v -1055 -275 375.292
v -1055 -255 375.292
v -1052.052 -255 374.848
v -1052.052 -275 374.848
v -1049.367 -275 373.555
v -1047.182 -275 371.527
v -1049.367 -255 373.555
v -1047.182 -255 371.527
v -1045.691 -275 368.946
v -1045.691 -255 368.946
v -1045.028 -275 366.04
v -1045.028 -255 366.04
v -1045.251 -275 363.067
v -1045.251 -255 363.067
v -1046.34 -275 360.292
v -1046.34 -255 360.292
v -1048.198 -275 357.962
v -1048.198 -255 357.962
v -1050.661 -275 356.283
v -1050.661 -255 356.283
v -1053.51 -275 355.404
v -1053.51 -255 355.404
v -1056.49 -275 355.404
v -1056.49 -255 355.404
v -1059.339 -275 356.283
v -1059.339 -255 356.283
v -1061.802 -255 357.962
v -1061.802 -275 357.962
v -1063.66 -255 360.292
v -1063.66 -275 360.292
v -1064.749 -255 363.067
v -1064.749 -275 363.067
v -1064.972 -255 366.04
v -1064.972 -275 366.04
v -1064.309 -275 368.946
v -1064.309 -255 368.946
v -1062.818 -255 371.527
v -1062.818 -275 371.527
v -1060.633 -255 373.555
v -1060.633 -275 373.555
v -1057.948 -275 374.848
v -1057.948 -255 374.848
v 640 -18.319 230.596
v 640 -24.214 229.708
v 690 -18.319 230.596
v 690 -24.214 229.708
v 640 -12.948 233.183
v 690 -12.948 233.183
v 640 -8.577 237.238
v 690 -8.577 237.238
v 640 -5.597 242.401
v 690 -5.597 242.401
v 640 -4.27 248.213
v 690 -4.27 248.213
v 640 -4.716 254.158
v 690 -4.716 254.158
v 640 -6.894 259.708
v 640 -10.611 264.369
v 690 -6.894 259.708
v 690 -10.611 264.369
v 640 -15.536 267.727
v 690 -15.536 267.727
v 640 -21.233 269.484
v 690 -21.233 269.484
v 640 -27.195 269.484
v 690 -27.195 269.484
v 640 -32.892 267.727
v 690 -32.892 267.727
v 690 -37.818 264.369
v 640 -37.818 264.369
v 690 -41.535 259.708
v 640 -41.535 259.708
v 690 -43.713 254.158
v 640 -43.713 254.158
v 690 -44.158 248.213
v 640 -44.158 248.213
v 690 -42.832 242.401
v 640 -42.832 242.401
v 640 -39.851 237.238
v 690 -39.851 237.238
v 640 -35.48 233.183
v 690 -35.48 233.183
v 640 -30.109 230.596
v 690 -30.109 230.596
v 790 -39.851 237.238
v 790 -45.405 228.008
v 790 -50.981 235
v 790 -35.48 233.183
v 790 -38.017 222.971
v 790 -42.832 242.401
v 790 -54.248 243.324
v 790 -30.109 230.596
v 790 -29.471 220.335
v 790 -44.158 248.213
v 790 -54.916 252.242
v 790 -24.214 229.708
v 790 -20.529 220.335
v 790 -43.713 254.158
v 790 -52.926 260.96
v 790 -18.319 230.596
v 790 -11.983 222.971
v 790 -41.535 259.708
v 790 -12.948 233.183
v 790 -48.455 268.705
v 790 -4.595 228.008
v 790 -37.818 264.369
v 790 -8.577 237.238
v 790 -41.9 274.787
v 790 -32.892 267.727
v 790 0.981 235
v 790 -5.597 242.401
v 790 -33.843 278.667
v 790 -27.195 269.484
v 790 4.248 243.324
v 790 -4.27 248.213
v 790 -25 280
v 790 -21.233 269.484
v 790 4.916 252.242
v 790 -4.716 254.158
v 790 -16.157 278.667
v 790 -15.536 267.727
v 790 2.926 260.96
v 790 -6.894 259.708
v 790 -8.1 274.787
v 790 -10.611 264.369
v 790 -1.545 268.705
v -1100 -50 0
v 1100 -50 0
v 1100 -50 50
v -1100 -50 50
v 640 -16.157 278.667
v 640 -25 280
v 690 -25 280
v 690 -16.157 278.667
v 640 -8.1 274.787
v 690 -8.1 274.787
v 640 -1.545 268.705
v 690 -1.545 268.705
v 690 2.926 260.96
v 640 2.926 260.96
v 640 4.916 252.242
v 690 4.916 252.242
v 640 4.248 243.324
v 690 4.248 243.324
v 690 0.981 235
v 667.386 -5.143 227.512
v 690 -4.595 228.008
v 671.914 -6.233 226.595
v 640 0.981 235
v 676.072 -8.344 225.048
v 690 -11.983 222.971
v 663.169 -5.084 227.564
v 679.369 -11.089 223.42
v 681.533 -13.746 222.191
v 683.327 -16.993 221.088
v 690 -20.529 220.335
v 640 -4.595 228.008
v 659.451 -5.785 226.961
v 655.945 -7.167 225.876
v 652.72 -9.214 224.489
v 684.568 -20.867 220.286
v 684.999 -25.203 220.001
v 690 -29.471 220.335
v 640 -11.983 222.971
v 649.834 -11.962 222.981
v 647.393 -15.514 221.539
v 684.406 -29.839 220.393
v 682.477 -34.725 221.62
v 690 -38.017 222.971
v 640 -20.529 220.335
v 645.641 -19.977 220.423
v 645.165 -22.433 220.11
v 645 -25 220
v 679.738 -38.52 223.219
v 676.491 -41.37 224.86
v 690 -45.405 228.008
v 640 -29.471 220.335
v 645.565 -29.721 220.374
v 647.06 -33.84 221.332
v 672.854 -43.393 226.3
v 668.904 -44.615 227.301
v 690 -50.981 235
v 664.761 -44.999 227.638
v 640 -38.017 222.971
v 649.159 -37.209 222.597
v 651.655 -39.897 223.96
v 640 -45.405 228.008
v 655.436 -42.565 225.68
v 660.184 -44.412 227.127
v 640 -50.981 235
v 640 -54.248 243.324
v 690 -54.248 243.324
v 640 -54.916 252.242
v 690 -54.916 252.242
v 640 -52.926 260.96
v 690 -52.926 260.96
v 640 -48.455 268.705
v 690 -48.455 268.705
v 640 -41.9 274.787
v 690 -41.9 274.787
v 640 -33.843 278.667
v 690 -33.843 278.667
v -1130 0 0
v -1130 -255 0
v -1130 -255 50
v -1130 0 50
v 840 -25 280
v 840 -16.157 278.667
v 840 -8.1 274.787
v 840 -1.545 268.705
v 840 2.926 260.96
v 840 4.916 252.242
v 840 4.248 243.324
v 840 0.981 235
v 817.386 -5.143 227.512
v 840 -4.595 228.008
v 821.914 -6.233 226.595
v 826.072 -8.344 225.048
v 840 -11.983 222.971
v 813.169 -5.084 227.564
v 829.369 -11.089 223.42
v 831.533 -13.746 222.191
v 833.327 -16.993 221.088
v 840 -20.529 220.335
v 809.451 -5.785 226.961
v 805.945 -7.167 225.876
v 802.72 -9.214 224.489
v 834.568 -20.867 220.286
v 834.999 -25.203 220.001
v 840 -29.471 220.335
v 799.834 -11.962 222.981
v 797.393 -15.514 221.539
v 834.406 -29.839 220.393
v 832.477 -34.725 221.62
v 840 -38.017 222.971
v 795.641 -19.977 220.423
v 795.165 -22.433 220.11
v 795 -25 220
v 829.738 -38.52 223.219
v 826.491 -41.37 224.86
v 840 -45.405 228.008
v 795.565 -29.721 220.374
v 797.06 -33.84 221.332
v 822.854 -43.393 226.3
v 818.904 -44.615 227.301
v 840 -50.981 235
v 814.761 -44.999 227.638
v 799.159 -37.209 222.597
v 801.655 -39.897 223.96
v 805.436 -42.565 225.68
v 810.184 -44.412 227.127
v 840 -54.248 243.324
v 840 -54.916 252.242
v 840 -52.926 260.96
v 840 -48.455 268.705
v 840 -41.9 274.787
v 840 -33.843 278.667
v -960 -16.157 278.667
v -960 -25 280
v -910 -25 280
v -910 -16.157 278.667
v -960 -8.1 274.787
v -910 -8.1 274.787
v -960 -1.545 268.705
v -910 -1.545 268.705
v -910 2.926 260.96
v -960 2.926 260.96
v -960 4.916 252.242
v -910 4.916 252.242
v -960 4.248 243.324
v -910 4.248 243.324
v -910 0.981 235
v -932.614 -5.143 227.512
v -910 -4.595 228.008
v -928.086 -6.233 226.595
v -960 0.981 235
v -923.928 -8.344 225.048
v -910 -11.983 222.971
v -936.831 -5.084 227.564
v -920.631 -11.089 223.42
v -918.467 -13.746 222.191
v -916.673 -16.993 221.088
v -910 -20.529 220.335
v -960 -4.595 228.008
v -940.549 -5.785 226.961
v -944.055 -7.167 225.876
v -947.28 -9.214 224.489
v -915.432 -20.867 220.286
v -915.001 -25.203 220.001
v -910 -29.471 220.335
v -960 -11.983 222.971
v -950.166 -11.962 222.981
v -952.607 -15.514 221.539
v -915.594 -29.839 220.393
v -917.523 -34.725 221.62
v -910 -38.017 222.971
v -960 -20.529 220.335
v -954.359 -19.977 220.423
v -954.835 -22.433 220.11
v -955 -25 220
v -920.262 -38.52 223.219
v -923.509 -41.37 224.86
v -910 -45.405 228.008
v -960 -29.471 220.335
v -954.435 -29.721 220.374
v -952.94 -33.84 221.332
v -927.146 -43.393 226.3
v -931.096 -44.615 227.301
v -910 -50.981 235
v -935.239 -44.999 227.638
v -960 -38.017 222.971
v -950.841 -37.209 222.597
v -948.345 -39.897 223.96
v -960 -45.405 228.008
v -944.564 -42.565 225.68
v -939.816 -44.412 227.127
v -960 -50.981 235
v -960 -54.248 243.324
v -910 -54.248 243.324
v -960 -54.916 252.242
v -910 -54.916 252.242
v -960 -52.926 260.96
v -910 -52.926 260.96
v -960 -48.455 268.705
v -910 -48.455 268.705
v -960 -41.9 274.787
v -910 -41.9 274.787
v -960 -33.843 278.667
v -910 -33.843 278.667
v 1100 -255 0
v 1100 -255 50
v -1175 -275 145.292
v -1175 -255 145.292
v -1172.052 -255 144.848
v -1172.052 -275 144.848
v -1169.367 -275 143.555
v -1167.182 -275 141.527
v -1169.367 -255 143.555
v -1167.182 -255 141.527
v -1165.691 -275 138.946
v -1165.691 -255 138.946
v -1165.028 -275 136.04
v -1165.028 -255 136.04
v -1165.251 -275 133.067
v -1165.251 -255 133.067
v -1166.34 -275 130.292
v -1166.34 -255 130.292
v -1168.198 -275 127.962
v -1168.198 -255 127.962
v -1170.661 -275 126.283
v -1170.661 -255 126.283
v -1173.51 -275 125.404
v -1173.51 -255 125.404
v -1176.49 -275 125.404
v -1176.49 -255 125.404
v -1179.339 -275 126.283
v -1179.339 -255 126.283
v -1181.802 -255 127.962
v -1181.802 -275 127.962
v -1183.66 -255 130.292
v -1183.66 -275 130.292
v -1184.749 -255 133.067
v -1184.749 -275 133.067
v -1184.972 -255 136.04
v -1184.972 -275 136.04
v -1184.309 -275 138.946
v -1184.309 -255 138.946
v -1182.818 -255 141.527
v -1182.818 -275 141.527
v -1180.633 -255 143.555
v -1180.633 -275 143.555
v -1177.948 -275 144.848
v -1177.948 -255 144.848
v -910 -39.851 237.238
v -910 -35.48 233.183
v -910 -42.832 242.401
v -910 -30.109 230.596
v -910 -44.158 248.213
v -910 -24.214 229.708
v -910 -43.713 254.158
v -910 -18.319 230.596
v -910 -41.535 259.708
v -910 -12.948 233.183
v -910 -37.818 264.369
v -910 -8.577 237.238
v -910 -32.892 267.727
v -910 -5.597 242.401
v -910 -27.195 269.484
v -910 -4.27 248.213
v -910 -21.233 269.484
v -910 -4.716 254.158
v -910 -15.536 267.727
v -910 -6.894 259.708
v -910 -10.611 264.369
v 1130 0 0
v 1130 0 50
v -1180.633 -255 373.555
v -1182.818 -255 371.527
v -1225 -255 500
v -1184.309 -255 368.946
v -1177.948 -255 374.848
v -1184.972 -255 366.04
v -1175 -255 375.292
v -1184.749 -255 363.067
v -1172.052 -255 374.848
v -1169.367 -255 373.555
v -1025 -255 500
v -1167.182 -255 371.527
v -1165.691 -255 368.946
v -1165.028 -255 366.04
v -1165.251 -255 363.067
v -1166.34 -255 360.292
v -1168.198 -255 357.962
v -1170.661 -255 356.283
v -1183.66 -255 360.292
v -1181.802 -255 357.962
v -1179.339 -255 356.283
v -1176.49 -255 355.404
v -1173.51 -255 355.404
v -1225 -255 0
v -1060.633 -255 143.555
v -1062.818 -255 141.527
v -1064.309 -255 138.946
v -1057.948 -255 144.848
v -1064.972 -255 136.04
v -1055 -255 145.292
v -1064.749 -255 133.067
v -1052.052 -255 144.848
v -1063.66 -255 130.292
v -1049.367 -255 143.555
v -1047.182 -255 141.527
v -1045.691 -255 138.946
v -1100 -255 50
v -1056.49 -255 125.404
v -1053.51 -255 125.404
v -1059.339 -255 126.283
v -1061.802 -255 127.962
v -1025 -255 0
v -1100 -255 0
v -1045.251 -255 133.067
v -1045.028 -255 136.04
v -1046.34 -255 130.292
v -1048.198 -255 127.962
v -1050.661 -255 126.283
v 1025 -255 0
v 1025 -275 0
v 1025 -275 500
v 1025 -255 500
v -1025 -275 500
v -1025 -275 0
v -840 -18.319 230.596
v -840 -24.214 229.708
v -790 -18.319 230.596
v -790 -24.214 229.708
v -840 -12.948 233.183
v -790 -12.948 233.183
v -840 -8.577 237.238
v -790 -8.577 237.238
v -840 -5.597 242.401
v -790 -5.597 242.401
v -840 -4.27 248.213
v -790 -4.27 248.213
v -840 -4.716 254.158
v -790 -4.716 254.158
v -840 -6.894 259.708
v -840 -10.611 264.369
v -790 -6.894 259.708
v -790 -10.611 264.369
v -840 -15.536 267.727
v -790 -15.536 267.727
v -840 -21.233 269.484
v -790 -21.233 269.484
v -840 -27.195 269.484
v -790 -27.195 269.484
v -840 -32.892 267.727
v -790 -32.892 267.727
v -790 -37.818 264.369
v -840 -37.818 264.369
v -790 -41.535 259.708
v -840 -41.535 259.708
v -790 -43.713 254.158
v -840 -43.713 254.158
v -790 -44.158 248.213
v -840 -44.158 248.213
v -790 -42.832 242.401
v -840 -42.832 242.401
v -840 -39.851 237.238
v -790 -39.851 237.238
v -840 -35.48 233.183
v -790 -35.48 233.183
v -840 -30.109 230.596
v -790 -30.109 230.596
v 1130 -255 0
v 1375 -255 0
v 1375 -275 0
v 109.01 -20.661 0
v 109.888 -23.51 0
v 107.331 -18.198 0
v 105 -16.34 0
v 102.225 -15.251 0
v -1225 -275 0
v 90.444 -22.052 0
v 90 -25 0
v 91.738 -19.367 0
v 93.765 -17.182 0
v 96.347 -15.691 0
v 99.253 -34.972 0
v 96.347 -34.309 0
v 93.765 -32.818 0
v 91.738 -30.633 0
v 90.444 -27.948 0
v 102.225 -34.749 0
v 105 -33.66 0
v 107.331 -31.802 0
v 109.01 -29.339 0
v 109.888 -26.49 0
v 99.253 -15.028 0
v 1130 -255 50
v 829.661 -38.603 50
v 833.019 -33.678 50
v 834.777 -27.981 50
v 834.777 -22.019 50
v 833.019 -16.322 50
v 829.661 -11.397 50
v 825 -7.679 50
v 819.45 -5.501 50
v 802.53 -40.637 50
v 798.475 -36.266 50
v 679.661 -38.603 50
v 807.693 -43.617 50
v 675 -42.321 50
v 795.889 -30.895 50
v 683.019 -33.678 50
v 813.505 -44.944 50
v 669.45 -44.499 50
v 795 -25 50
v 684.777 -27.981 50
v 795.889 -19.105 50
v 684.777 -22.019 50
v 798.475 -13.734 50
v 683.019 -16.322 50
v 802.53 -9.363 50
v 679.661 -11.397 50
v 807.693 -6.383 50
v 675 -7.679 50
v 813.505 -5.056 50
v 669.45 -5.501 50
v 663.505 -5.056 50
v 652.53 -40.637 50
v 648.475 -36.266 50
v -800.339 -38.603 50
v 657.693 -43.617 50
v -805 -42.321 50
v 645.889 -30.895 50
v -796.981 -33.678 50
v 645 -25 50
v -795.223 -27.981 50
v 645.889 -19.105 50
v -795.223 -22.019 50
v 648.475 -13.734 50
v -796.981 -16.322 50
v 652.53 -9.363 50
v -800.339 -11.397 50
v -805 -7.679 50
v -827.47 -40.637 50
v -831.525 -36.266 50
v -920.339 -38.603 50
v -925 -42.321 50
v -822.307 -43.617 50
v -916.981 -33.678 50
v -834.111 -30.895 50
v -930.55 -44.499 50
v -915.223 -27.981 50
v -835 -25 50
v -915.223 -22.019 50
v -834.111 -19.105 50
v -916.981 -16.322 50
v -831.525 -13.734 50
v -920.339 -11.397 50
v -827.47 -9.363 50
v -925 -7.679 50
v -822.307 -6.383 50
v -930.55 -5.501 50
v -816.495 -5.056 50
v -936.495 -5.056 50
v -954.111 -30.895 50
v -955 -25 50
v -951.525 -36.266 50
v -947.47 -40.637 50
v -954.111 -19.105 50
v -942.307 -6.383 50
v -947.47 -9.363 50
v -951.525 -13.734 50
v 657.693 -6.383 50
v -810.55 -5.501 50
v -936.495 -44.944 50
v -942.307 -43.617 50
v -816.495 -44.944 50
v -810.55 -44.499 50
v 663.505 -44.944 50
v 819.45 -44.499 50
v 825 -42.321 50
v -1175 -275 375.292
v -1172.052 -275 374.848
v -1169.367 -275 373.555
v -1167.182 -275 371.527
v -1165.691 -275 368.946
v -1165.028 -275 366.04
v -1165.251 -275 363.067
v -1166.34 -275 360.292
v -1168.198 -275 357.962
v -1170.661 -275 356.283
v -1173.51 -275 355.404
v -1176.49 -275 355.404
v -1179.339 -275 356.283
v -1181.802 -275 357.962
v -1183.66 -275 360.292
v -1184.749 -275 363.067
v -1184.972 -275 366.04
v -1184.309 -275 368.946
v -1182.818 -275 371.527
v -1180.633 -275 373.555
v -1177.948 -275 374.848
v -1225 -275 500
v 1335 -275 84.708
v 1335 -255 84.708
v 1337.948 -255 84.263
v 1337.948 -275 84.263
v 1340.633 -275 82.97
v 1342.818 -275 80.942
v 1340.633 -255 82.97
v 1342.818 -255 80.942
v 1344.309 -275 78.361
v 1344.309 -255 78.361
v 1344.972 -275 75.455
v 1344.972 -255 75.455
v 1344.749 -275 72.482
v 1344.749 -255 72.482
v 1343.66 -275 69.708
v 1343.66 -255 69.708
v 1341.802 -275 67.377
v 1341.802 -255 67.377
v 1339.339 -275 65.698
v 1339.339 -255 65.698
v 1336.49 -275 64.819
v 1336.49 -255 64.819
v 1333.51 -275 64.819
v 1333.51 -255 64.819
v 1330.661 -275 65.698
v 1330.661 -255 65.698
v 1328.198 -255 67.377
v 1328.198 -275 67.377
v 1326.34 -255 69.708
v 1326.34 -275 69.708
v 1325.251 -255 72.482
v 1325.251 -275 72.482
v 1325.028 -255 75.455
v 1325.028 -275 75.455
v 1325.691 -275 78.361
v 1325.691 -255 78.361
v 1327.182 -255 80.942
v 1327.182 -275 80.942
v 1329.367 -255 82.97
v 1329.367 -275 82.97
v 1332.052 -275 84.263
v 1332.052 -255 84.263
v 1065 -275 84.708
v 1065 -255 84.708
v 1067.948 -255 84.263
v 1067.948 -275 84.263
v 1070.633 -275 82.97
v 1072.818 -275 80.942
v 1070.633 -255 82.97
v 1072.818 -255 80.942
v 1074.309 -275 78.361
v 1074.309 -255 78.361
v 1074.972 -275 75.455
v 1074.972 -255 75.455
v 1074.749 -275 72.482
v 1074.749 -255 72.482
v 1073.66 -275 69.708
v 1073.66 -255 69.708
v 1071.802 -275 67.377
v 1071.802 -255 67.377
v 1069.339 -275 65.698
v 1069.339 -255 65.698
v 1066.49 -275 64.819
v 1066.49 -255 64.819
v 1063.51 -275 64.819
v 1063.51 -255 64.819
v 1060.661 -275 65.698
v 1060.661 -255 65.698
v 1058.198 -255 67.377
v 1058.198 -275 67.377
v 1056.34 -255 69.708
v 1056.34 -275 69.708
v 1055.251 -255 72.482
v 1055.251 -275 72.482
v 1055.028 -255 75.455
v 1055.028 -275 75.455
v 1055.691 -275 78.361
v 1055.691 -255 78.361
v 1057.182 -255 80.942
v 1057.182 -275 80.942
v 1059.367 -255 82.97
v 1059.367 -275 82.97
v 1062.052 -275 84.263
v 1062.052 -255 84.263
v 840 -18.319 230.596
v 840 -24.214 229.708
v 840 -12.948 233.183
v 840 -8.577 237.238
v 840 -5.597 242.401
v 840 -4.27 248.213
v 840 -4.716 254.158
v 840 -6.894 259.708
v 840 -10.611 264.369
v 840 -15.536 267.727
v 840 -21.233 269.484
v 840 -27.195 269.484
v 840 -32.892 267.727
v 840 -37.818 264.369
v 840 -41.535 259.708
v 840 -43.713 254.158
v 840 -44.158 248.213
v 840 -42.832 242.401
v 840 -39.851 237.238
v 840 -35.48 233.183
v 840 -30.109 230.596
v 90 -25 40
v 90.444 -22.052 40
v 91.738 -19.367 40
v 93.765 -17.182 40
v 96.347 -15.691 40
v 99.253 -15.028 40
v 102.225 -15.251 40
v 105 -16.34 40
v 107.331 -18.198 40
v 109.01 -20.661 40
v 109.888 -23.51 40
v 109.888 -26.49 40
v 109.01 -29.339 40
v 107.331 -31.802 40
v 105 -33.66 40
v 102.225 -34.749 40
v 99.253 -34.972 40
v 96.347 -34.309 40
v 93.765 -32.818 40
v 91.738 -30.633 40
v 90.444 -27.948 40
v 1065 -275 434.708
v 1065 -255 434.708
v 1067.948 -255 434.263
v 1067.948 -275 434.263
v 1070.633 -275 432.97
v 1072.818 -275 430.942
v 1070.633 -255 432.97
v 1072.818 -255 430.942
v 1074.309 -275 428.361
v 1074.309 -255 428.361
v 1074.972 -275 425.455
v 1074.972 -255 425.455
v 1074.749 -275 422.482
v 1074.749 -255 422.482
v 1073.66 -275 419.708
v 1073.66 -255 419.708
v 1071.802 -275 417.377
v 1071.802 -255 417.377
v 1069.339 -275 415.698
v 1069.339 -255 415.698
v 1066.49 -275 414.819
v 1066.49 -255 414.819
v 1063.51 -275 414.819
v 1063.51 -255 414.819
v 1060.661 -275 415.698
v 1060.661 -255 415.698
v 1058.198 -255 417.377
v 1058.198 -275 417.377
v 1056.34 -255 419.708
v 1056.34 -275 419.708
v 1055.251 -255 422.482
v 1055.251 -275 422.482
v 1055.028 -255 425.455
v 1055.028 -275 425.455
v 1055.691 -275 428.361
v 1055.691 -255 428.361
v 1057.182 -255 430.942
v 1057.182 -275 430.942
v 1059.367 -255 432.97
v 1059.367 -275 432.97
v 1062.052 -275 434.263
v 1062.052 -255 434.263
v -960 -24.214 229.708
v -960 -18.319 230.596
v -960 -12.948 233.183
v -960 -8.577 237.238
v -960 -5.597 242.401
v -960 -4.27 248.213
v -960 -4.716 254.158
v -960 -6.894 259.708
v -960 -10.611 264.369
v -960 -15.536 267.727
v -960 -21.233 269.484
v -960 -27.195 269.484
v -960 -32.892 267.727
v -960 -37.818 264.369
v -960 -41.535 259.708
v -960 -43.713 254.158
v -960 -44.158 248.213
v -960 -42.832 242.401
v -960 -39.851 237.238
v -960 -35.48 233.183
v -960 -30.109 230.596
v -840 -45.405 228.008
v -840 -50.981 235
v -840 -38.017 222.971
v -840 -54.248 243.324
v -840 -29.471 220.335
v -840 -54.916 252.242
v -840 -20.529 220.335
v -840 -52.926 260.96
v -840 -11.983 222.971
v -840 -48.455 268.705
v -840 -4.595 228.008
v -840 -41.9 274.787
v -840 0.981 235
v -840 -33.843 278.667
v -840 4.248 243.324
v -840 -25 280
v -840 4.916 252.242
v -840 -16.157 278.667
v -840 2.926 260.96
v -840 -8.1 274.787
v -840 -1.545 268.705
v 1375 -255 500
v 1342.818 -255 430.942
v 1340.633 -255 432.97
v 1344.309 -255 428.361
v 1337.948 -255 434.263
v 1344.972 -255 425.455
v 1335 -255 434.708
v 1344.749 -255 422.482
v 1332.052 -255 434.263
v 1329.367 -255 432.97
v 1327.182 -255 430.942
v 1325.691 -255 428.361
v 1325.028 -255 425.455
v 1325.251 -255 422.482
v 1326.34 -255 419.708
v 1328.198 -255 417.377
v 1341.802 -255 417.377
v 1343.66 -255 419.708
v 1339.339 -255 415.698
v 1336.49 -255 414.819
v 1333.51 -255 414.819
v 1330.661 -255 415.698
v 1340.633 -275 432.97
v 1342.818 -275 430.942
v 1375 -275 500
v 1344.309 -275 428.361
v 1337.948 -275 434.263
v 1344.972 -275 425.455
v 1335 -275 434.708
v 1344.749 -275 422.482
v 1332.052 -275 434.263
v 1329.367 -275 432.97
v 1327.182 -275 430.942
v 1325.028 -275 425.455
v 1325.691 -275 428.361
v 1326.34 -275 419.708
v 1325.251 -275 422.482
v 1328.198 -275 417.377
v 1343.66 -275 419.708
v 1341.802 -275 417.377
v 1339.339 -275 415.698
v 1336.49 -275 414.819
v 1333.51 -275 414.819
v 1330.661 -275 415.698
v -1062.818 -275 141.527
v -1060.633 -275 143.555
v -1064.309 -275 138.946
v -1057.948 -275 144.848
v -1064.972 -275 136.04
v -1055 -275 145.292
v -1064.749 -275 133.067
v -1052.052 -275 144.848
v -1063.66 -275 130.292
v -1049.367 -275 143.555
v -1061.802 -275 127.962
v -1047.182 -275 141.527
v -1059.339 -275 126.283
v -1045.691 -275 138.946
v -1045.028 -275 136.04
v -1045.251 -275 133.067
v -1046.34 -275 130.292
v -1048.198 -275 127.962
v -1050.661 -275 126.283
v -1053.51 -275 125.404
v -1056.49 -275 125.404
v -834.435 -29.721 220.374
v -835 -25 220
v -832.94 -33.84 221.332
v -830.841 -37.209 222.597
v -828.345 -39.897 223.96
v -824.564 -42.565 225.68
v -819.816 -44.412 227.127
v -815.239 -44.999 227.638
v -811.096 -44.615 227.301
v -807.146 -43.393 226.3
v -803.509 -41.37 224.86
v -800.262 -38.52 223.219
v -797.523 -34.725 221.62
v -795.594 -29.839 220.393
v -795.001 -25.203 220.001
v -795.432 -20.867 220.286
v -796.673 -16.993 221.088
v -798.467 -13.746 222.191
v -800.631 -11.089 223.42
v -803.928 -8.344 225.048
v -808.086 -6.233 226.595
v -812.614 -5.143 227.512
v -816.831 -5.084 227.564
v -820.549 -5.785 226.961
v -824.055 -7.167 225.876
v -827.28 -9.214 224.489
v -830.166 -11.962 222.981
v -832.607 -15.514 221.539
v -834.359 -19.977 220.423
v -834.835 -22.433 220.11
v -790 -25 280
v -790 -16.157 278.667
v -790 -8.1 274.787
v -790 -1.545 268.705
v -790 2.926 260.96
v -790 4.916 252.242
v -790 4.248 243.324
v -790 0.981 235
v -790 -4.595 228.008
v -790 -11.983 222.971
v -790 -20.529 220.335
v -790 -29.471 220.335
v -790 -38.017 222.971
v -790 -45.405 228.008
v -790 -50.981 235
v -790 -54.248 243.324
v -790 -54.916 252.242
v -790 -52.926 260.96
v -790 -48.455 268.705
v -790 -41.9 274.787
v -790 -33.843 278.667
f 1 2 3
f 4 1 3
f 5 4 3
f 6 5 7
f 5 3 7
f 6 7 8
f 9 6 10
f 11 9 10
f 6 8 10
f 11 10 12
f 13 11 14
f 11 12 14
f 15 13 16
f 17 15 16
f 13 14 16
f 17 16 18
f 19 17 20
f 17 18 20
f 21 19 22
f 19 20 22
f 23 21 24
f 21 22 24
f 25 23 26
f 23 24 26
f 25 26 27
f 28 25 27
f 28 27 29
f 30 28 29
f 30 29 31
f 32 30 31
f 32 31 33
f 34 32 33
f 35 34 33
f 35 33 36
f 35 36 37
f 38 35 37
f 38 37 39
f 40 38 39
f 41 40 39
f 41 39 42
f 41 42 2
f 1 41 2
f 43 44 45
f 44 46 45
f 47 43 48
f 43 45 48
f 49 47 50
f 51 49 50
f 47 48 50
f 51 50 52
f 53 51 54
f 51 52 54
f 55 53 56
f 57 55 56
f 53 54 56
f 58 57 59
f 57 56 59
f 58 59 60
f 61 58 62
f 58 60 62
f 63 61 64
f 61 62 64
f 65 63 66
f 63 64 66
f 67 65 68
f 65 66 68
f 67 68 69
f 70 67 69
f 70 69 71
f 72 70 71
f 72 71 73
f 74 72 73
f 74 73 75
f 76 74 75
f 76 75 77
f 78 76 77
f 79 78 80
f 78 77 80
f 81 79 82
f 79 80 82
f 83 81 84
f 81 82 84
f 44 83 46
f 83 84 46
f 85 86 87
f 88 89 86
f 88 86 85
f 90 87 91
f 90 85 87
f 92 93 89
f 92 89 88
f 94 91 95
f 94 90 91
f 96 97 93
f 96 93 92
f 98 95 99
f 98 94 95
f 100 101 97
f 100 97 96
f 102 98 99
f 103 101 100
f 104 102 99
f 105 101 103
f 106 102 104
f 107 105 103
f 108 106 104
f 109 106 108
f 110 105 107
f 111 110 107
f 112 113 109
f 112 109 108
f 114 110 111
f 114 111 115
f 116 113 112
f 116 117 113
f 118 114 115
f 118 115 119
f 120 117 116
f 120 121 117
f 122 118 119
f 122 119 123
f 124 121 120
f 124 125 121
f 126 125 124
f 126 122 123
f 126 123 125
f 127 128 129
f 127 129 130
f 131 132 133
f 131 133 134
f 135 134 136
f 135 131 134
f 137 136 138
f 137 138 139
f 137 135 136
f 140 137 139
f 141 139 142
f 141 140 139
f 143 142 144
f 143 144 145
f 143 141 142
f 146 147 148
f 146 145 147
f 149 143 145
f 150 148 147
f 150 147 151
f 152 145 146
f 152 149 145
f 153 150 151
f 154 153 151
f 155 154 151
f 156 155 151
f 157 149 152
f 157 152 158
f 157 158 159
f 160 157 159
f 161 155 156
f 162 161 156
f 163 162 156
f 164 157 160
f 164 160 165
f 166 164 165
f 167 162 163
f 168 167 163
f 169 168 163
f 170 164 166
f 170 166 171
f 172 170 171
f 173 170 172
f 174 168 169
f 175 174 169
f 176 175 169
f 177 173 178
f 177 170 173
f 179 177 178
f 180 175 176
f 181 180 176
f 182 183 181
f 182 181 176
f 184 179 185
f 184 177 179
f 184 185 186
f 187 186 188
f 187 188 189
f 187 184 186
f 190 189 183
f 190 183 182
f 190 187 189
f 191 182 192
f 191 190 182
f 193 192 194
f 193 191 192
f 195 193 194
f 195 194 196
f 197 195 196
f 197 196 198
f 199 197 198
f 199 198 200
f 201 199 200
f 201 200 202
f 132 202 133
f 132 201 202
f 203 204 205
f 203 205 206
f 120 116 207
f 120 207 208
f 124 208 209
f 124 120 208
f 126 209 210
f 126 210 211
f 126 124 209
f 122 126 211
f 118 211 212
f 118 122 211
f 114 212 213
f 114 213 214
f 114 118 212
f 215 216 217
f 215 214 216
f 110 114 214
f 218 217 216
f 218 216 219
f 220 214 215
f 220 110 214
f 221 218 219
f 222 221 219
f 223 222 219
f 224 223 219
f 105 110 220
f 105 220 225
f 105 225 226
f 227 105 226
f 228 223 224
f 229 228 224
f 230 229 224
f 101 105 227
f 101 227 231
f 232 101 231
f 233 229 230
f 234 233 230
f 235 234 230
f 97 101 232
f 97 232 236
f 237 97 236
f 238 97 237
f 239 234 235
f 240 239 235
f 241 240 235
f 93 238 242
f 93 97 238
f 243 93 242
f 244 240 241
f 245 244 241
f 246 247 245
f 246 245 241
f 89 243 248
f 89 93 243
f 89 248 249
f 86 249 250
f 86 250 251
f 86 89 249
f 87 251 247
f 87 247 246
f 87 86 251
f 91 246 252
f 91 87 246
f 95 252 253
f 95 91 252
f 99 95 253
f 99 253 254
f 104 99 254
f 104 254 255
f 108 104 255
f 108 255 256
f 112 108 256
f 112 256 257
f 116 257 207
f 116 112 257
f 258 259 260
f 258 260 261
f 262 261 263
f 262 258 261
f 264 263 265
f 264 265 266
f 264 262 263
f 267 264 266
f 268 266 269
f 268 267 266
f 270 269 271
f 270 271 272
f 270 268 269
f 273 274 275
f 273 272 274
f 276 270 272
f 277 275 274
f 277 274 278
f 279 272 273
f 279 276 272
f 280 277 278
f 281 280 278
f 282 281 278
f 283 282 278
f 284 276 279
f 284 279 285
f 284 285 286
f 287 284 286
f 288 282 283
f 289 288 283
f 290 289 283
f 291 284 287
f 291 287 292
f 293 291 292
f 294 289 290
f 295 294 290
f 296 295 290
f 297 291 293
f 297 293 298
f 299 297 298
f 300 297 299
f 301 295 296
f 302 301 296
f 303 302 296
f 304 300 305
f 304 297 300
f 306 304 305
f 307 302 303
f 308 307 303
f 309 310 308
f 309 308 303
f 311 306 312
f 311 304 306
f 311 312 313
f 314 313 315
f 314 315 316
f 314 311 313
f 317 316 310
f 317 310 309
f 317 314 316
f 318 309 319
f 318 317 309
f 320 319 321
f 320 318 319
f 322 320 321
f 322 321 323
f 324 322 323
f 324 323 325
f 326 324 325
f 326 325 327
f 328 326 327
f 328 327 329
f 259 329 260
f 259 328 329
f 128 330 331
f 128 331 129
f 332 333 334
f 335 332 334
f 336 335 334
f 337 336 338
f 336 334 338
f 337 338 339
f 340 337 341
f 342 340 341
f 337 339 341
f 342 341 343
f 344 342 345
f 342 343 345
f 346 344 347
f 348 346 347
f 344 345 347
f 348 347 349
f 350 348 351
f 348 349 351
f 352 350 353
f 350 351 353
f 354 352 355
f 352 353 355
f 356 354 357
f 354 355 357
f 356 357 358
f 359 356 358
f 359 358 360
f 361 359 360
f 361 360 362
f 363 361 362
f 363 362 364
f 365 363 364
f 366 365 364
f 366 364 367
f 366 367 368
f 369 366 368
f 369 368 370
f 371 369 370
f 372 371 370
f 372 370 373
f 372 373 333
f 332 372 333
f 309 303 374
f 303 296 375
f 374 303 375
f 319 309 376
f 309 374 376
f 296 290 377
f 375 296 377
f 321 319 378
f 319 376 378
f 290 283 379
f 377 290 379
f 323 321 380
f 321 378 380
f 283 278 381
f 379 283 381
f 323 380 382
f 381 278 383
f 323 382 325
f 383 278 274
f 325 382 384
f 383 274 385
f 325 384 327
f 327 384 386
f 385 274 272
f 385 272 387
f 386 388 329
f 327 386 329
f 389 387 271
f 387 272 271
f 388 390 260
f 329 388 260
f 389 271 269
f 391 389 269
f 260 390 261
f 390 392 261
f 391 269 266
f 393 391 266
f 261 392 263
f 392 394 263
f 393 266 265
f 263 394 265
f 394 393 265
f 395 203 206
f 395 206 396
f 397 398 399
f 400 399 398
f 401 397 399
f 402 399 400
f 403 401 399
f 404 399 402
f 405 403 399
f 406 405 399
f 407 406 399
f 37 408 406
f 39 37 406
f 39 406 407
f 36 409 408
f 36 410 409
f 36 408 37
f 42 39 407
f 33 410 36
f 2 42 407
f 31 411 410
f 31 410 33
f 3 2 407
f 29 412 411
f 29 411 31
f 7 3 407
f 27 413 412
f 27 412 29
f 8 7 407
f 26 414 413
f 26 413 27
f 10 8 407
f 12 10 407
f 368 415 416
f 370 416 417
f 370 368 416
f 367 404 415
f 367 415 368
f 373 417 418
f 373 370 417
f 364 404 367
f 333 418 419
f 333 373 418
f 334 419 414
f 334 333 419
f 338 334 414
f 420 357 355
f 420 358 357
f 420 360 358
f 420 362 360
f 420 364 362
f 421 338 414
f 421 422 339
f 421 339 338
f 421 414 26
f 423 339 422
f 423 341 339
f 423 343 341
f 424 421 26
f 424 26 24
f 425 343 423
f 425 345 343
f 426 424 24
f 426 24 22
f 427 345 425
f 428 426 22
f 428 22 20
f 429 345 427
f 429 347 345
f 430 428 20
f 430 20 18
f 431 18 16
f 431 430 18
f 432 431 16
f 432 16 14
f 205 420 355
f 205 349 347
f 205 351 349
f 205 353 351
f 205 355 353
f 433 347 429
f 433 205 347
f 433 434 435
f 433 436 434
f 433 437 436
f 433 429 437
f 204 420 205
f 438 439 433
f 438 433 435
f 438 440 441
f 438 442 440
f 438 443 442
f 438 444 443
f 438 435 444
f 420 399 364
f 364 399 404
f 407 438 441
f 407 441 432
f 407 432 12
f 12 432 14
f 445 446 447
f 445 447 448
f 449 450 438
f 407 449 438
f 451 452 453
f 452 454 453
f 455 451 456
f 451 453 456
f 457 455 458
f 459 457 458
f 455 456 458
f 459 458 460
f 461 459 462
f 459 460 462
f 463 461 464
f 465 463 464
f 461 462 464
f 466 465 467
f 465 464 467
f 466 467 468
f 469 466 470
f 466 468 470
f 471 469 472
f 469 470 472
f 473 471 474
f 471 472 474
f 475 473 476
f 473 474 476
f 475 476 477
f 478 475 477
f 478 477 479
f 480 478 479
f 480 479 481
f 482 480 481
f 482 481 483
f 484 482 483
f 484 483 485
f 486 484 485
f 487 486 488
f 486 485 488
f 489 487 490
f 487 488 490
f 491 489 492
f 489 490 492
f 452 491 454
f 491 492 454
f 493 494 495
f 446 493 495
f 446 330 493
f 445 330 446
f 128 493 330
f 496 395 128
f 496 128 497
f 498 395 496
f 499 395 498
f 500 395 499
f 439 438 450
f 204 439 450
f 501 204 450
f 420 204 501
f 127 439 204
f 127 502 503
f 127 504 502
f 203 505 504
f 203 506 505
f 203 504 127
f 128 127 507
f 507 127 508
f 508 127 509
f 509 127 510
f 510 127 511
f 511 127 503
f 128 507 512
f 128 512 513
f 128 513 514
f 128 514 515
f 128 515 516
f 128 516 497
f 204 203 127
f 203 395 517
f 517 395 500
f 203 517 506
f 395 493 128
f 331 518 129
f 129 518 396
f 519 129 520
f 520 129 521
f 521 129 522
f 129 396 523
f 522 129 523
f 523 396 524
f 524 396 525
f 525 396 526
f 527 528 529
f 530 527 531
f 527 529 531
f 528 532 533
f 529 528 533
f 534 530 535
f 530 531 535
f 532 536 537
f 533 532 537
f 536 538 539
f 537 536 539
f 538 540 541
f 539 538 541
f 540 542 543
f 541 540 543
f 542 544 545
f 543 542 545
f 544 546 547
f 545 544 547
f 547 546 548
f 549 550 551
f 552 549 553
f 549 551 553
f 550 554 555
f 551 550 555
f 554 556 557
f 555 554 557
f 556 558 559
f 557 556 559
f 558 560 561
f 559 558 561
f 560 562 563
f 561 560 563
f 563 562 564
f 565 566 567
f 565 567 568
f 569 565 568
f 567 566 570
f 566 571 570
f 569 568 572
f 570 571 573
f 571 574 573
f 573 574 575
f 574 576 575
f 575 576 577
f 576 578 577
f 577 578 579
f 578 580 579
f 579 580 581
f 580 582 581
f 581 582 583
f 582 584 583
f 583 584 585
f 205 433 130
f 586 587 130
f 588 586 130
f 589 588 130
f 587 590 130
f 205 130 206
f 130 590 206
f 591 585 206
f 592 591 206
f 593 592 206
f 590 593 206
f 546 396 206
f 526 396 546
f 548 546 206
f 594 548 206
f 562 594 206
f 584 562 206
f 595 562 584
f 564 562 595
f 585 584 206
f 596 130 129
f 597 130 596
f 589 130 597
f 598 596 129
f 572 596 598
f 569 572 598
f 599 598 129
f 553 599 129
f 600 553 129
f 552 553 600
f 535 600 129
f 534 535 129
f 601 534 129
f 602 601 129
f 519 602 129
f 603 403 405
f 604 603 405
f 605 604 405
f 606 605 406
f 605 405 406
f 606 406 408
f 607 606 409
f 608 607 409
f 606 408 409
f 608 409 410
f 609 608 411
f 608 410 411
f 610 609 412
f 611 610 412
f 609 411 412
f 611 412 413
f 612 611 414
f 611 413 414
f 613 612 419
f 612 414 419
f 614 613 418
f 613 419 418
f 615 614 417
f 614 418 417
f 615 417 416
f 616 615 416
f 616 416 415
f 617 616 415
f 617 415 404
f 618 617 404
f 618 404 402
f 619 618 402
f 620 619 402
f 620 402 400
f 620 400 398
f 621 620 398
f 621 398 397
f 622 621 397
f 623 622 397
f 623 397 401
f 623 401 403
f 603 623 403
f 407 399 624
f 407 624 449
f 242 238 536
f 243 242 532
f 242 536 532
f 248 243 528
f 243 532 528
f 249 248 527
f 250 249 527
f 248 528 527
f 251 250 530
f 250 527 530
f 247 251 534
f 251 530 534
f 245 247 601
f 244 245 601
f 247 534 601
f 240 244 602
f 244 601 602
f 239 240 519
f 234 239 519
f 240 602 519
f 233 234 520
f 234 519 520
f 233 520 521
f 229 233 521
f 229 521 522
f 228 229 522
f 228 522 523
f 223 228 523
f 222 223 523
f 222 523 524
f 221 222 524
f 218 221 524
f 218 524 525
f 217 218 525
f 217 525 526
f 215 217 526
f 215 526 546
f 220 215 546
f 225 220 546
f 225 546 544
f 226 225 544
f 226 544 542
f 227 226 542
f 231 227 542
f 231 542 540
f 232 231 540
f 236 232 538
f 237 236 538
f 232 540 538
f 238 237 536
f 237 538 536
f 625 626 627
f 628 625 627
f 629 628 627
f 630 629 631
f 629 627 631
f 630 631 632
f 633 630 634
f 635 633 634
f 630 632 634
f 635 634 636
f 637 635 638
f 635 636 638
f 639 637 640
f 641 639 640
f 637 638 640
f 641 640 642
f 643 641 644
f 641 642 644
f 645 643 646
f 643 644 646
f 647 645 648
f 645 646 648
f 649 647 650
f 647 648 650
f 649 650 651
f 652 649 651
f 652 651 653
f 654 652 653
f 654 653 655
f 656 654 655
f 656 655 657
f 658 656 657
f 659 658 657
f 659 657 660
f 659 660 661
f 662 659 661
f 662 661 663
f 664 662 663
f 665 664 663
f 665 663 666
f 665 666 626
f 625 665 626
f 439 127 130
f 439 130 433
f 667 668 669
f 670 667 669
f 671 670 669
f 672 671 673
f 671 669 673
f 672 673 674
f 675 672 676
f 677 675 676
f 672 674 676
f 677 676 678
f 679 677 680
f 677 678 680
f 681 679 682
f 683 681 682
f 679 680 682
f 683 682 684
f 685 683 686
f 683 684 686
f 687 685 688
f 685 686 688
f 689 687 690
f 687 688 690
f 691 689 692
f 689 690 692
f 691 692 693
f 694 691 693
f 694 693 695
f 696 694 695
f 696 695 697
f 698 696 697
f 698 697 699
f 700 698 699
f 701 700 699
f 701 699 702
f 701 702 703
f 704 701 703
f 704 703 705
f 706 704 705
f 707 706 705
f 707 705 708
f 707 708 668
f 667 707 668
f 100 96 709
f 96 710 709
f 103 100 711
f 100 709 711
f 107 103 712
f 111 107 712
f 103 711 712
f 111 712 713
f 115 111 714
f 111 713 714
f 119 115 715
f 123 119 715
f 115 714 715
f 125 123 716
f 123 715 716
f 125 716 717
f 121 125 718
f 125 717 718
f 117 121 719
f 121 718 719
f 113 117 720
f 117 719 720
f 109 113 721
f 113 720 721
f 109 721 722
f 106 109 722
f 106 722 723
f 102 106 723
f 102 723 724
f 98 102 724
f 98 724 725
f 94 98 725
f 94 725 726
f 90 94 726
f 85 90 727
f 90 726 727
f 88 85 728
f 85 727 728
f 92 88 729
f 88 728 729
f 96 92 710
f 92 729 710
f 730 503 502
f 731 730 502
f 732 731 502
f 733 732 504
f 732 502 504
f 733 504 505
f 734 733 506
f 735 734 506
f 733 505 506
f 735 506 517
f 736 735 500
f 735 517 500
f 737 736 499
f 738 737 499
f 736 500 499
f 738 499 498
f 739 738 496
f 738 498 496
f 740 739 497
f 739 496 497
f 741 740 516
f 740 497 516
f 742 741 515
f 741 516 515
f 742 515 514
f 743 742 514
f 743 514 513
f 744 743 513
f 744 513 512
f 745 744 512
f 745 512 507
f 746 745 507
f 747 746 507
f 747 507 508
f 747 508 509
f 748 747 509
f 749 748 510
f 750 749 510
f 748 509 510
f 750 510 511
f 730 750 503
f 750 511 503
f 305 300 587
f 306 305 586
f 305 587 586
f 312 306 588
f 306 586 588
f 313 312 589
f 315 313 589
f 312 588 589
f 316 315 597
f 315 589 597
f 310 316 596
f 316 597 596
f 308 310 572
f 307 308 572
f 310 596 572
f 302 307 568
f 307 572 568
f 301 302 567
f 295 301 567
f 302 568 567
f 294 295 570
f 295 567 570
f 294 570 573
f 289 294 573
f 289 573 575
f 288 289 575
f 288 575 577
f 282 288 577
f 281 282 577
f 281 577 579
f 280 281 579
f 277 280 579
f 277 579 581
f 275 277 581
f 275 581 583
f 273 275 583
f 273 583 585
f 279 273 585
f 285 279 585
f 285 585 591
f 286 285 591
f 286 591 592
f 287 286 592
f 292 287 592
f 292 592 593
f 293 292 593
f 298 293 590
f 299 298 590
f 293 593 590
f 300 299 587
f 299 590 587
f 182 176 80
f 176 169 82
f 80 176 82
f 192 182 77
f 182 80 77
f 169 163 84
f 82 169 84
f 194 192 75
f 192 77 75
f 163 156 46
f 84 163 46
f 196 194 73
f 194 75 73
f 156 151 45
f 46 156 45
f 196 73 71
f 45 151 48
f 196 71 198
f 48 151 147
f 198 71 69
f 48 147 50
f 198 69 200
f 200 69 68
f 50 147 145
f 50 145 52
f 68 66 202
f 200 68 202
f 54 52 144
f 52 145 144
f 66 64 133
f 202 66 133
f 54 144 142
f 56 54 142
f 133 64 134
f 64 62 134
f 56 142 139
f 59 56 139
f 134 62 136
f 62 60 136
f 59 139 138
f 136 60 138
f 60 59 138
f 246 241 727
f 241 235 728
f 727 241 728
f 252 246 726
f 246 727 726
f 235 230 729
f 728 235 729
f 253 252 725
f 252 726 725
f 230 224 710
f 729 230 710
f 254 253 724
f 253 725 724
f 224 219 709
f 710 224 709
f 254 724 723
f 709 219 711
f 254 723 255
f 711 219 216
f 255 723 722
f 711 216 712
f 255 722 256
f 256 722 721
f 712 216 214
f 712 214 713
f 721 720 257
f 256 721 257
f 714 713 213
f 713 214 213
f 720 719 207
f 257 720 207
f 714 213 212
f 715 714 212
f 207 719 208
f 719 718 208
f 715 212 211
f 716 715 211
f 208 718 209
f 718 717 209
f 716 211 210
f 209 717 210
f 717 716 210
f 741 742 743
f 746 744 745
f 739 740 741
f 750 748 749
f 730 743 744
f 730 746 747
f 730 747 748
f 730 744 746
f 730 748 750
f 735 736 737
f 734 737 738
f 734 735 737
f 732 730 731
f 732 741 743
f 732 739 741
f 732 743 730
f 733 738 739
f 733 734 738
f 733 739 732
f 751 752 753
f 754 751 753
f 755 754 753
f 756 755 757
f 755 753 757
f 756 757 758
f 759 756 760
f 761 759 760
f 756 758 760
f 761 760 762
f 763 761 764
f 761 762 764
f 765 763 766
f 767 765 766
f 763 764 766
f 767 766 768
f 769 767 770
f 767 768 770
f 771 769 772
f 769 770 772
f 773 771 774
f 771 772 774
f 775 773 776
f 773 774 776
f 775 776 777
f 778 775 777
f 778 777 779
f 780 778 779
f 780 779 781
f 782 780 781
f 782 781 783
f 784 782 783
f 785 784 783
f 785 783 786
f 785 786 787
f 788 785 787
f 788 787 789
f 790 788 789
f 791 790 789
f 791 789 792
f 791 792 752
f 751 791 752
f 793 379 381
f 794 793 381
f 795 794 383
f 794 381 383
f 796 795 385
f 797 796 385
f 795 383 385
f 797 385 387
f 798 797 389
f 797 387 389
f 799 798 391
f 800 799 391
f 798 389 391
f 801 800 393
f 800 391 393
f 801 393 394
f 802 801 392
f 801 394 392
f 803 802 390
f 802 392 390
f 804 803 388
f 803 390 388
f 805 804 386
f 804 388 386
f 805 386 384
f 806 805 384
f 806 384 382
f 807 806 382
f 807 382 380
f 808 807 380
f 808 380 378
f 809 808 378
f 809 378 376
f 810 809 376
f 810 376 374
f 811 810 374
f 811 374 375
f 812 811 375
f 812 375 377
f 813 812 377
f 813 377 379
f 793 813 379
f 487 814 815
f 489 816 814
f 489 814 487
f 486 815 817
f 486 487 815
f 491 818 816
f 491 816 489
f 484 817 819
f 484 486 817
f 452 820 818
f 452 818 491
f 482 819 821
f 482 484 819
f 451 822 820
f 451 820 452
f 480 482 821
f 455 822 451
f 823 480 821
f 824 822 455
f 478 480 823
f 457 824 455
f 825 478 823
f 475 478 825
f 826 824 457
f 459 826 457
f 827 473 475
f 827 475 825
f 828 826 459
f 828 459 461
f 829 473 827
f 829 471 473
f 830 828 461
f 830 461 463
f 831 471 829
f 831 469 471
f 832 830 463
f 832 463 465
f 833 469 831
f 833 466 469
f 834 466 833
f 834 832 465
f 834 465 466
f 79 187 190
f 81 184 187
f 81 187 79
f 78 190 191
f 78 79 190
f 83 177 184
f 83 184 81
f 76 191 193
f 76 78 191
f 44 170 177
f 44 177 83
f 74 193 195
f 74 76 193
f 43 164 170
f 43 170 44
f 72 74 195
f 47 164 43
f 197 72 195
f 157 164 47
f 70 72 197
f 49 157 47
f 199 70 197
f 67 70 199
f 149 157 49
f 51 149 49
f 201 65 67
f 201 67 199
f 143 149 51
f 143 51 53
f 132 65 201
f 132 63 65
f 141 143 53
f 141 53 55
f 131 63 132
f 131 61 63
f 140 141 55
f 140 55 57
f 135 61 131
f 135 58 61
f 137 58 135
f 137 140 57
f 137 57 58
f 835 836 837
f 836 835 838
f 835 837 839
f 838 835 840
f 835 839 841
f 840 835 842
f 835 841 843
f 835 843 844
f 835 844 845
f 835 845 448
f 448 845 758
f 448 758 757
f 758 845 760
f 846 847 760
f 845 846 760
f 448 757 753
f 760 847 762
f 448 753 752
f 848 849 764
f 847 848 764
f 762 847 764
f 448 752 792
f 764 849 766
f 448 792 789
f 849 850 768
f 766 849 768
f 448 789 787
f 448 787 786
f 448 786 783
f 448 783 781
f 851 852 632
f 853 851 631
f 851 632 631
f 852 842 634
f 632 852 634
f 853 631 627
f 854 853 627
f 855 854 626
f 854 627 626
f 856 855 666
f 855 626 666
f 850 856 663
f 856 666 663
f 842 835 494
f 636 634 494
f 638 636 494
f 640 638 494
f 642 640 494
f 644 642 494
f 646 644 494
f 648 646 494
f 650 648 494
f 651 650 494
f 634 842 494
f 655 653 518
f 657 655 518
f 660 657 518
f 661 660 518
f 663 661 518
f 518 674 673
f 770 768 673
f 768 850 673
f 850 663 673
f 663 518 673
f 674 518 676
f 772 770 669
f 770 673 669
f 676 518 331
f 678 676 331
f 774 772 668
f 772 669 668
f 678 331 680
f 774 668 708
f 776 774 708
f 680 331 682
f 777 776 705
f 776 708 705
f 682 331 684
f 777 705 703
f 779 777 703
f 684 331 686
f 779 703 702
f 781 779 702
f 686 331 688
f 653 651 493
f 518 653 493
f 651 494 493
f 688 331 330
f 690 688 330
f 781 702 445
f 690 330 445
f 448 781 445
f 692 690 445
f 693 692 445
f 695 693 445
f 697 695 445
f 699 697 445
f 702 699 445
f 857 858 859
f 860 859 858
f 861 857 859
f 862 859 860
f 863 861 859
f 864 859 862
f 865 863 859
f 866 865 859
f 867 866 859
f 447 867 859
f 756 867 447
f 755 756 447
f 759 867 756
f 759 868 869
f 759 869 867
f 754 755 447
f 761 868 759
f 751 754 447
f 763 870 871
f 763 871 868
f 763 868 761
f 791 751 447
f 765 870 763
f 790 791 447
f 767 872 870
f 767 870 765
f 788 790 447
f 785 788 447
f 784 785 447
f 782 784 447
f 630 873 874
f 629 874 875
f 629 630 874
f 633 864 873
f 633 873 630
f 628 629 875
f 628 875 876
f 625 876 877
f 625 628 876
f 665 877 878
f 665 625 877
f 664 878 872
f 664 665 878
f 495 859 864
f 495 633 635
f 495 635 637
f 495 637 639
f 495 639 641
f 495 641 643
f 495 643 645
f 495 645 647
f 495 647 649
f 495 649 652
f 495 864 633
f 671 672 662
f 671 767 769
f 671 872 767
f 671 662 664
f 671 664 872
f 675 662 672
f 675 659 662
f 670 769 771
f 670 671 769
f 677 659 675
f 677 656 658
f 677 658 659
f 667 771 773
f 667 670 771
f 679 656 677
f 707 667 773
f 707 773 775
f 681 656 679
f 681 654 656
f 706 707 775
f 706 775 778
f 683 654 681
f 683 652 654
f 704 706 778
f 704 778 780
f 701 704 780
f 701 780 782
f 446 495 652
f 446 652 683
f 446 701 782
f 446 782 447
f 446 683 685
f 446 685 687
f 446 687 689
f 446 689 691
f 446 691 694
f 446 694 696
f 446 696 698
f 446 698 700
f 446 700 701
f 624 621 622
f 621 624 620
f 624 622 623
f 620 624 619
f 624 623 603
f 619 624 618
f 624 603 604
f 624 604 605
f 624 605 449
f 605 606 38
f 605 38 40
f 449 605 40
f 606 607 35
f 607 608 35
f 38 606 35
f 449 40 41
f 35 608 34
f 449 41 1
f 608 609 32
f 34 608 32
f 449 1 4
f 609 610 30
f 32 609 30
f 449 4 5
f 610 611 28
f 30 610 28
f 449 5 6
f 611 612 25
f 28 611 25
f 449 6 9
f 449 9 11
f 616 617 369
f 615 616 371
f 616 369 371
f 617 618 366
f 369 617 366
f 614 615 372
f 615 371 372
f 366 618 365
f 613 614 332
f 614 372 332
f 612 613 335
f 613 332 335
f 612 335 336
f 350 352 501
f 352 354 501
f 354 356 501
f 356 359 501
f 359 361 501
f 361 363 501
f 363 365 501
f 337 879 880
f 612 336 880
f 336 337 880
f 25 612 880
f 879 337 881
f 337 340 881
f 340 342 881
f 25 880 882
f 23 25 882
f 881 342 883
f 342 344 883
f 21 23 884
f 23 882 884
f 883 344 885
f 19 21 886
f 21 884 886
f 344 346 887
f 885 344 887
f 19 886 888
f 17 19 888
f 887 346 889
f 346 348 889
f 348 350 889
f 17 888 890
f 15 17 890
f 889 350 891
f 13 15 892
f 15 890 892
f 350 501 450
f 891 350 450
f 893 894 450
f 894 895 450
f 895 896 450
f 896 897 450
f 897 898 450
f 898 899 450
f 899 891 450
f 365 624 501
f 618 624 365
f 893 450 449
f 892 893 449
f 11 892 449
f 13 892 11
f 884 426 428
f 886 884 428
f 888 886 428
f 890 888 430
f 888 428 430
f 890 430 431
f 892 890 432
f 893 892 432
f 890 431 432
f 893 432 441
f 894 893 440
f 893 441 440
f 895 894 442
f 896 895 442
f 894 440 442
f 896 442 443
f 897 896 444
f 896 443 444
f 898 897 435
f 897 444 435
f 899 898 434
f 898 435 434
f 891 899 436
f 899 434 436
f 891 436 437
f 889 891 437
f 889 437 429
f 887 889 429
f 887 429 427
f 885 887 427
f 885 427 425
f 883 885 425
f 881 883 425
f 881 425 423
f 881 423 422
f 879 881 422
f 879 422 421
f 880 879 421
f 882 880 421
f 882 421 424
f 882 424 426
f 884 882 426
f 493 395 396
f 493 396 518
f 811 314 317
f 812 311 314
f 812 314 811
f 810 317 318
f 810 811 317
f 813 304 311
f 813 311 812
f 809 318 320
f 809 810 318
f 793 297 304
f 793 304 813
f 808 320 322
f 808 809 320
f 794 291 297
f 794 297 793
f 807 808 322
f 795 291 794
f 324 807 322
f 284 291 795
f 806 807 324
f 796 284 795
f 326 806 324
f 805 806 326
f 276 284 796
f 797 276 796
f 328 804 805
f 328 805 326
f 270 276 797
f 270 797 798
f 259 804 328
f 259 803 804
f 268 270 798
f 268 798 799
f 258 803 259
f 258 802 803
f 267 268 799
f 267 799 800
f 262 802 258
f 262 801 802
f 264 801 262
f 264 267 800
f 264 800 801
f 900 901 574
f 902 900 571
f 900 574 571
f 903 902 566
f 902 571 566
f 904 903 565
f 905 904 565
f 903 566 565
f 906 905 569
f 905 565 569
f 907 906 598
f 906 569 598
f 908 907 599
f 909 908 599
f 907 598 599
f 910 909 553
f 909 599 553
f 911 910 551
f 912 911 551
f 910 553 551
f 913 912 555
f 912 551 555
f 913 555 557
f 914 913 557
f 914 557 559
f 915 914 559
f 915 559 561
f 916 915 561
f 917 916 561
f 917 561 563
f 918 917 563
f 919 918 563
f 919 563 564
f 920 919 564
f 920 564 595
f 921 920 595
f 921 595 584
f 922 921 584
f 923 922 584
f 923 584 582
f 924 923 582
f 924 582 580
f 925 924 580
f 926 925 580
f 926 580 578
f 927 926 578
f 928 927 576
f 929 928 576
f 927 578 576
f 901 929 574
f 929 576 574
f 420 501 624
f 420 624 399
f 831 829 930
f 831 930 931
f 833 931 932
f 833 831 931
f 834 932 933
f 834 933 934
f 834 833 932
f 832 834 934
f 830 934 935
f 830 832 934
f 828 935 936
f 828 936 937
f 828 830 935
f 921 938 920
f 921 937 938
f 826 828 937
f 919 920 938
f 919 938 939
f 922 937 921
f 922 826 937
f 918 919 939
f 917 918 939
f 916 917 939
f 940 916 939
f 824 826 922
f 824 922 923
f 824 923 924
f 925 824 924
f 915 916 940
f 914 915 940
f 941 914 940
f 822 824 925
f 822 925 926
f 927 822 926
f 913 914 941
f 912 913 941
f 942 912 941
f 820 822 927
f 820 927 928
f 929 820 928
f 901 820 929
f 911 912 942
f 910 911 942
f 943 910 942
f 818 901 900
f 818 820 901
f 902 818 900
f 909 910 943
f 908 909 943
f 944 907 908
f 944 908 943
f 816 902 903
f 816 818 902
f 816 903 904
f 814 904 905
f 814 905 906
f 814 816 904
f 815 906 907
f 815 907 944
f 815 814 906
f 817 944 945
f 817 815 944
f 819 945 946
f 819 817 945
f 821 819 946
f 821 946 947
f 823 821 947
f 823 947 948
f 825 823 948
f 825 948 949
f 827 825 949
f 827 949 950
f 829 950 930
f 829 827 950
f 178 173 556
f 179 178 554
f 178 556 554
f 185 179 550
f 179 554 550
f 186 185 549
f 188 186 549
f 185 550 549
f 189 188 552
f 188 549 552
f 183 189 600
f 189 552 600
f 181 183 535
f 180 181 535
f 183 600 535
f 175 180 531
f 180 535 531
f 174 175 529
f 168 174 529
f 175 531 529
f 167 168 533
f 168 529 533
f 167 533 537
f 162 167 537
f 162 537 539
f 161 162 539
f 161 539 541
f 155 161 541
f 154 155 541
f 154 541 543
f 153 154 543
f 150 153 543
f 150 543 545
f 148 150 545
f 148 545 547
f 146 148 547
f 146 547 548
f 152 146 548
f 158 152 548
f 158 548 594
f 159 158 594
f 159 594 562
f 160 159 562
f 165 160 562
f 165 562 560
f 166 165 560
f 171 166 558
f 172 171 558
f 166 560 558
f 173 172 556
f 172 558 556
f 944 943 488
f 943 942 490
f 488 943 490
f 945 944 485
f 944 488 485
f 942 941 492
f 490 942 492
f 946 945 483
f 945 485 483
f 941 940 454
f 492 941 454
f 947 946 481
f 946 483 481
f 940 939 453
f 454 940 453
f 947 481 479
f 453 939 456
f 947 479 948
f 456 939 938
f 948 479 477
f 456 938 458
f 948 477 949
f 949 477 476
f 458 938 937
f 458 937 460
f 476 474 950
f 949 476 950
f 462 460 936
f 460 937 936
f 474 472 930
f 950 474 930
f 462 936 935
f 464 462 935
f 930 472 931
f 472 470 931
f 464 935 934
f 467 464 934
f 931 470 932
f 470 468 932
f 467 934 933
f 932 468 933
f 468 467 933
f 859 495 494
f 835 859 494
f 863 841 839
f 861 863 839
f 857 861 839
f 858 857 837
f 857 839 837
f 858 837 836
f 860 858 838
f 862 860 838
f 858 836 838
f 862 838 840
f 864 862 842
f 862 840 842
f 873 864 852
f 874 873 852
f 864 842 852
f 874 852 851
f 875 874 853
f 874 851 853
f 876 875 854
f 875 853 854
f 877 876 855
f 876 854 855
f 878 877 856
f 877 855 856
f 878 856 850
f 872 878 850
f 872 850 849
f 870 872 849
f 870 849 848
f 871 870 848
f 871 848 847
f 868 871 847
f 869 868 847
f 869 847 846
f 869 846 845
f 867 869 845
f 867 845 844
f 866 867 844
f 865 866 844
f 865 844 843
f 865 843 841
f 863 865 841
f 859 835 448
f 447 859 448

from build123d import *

# Parameters (mm, degrees)
BOSS_EXTRUDE1_DEPTH = 50
SKETCH2_W           = 200
SKETCH2_H           = 20
BOSS_EXTRUDE2_DEPTH = 500
SKETCH4_R           = 20
BOSS_EXTRUDE3_DEPTH = 200
SKETCH6_R           = 30
SKETCH6_R_2         = 12
BOSS_EXTRUDE4_DEPTH = 25
SKETCH8_W           = 350
SKETCH8_H           = 20
BOSS_EXTRUDE5_DEPTH = 500
SKETCH9_R           = 20
CUT_EXTRUDE1_DEPTH  = 2356.175152722
LPATTERN2_COUNT     = 2
LPATTERN2_PITCH     = 1750
LPATTERN4_COUNT     = 2
LPATTERN4_PITCH     = 120
LPATTERN5_COUNT     = 2
LPATTERN5_PITCH     = 1600
CUT_EXTRUDE2_REACH  = 1488.01
SKETCH10_R          = 10
SKETCH11_R          = 10
CUT_EXTRUDE3_DEPTH  = 40


with BuildPart() as part:
    # Sketch1 → Boss-Extrude1 (new body)
    with BuildSketch(Plane.XY):
        Polygon((-1130, 0), (1130, 0), (1130, -255), (1100, -255), (1100, -50), (-1100, -50), (-1100, -255), (-1130, -255), align=None)
    extrude(amount=BOSS_EXTRUDE1_DEPTH)

    # Sketch2 → Boss-Extrude2 (add)
    with BuildSketch(Plane.XY):
        with Locations((-1125, -265)):
            Rectangle(SKETCH2_W, SKETCH2_H)
    extrude(amount=BOSS_EXTRUDE2_DEPTH)

    # Sketch4 → Boss-Extrude3 (add)
    with BuildSketch(Plane.XY.offset(50)):
        with Locations(Location((-935, -25, 0), (0, 0, 180))):
            Circle(SKETCH4_R)
    boss_extrude3 = extrude(amount=BOSS_EXTRUDE3_DEPTH)

    # Sketch6 → Boss-Extrude4 (add, symmetric)
    with BuildSketch(Plane(origin=(-935, 0, 0), x_dir=(0, -1, 0), z_dir=(-1, 0, 0))):
        with Locations(Location((25, 250, 0), (0, 0, 90))):
            Circle(SKETCH6_R)
        with Locations(Location((25, 250, 0), (0, 0, 90))):
            Circle(SKETCH6_R_2, mode=Mode.SUBTRACT)
    boss_extrude4 = extrude(amount=BOSS_EXTRUDE4_DEPTH, both=True)

    # Sketch8 → Boss-Extrude5 (add)
    with BuildSketch(Plane(origin=(0, 0, 0), x_dir=(-1, 0, 0), z_dir=(0, 0, -1))):
        with Locations((-1200, -265)):
            Rectangle(SKETCH8_W, SKETCH8_H)
    extrude(amount=-BOSS_EXTRUDE5_DEPTH)

    # Sketch9 → Cut-Extrude1 (cut, through all)
    with BuildSketch(Plane(origin=(-910, 0, 0), x_dir=(0, 0, -1), z_dir=(1, 0, 0))):
        with Locations((-249.707622987, -24.214075722)):
            Circle(SKETCH9_R)
    cut_extrude1 = extrude(amount=-CUT_EXTRUDE1_DEPTH, mode=Mode.SUBTRACT)

    # LPattern2: Boss-Extrude3, Boss-Extrude4, Cut-Extrude1 ×2
    with Locations(*[(i * LPATTERN2_PITCH, 0, 0) for i in range(1, LPATTERN2_COUNT)]):
        add(boss_extrude3)
        add(boss_extrude4)
        add(cut_extrude1, mode=Mode.SUBTRACT)

    # LPattern4: Boss-Extrude3, Boss-Extrude4, Cut-Extrude1 ×2
    with Locations(*[(i * LPATTERN4_PITCH, 0, 0) for i in range(1, LPATTERN4_COUNT)]):
        add(boss_extrude3)
        add(boss_extrude4)
        add(cut_extrude1, mode=Mode.SUBTRACT)

    # LPattern5: Boss-Extrude3, Boss-Extrude4, Cut-Extrude1 ×2
    with Locations(*[(i * LPATTERN5_PITCH, 0, 0) for i in range(1, LPATTERN5_COUNT)]):
        add(boss_extrude3)
        add(boss_extrude4)
        add(cut_extrude1, mode=Mode.SUBTRACT)

    # Sketch10 → Cut-Extrude2 (cut, up to next)
    with BuildSketch(Plane(origin=(0, -255, 0), x_dir=(1, 0, 0), z_dir=(0, 1, 0)), mode=Mode.PRIVATE) as cut_extrude2_sk1:
        with Locations(Location((1065, -424.7076, 0), (0, 0, 270))):
            Circle(SKETCH10_R)
    cut_extrude2_tool1 = extrude(cut_extrude2_sk1.sketch, amount=-CUT_EXTRUDE2_REACH, mode=Mode.PRIVATE) & part.part
    # Sketch10 → Cut-Extrude2 (cut, up to next)
    with BuildSketch(Plane(origin=(0, -255, 0), x_dir=(1, 0, 0), z_dir=(0, 1, 0)), mode=Mode.PRIVATE) as cut_extrude2_sk2:
        with Locations(Location((1065, -74.7076, 0), (0, 0, 270))):
            Circle(SKETCH10_R)
    cut_extrude2_tool2 = extrude(cut_extrude2_sk2.sketch, amount=-CUT_EXTRUDE2_REACH, mode=Mode.PRIVATE) & part.part
    # Sketch10 → Cut-Extrude2 (cut, up to next)
    with BuildSketch(Plane(origin=(0, -255, 0), x_dir=(1, 0, 0), z_dir=(0, 1, 0)), mode=Mode.PRIVATE) as cut_extrude2_sk3:
        with Locations(Location((1335, -424.7076, 0), (0, 0, 270))):
            Circle(SKETCH10_R)
    cut_extrude2_tool3 = extrude(cut_extrude2_sk3.sketch, amount=-CUT_EXTRUDE2_REACH, mode=Mode.PRIVATE) & part.part
    # Sketch10 → Cut-Extrude2 (cut, up to next)
    with BuildSketch(Plane(origin=(0, -255, 0), x_dir=(1, 0, 0), z_dir=(0, 1, 0)), mode=Mode.PRIVATE) as cut_extrude2_sk4:
        with Locations(Location((1335, -74.7076, 0), (0, 0, 270))):
            Circle(SKETCH10_R)
    cut_extrude2_tool4 = extrude(cut_extrude2_sk4.sketch, amount=-CUT_EXTRUDE2_REACH, mode=Mode.PRIVATE) & part.part
    # Sketch10 → Cut-Extrude2 (cut, up to next)
    with BuildSketch(Plane(origin=(0, -255, 0), x_dir=(1, 0, 0), z_dir=(0, 1, 0)), mode=Mode.PRIVATE) as cut_extrude2_sk5:
        with Locations(Location((-1175, -365.2924, 0), (0, 0, 270))):
            Circle(SKETCH10_R)
    cut_extrude2_tool5 = extrude(cut_extrude2_sk5.sketch, amount=-CUT_EXTRUDE2_REACH, mode=Mode.PRIVATE) & part.part
    # Sketch10 → Cut-Extrude2 (cut, up to next)
    with BuildSketch(Plane(origin=(0, -255, 0), x_dir=(1, 0, 0), z_dir=(0, 1, 0)), mode=Mode.PRIVATE) as cut_extrude2_sk6:
        with Locations(Location((-1055, -365.2924, 0), (0, 0, 270))):
            Circle(SKETCH10_R)
    cut_extrude2_tool6 = extrude(cut_extrude2_sk6.sketch, amount=-CUT_EXTRUDE2_REACH, mode=Mode.PRIVATE) & part.part
    # Sketch10 → Cut-Extrude2 (cut, up to next)
    with BuildSketch(Plane(origin=(0, -255, 0), x_dir=(1, 0, 0), z_dir=(0, 1, 0)), mode=Mode.PRIVATE) as cut_extrude2_sk7:
        with Locations(Location((-1175, -135.2924, 0), (0, 0, 270))):
            Circle(SKETCH10_R)
    cut_extrude2_tool7 = extrude(cut_extrude2_sk7.sketch, amount=-CUT_EXTRUDE2_REACH, mode=Mode.PRIVATE) & part.part
    # Sketch10 → Cut-Extrude2 (cut, up to next)
    with BuildSketch(Plane(origin=(0, -255, 0), x_dir=(1, 0, 0), z_dir=(0, 1, 0)), mode=Mode.PRIVATE) as cut_extrude2_sk8:
        with Locations(Location((-1055, -135.2924, 0), (0, 0, 270))):
            Circle(SKETCH10_R)
    cut_extrude2_tool8 = extrude(cut_extrude2_sk8.sketch, amount=-CUT_EXTRUDE2_REACH, mode=Mode.PRIVATE) & part.part
    add(cut_extrude2_tool1.solids().sort_by_distance((1065, -255, 424.7076))[0], mode=Mode.SUBTRACT)
    add(cut_extrude2_tool2.solids().sort_by_distance((1065, -255, 74.7076))[0], mode=Mode.SUBTRACT)
    add(cut_extrude2_tool3.solids().sort_by_distance((1335, -255, 424.7076))[0], mode=Mode.SUBTRACT)
    add(cut_extrude2_tool4.solids().sort_by_distance((1335, -255, 74.7076))[0], mode=Mode.SUBTRACT)
    add(cut_extrude2_tool5.solids().sort_by_distance((-1175, -255, 365.2924))[0], mode=Mode.SUBTRACT)
    add(cut_extrude2_tool6.solids().sort_by_distance((-1055, -255, 365.2924))[0], mode=Mode.SUBTRACT)
    add(cut_extrude2_tool7.solids().sort_by_distance((-1175, -255, 135.2924))[0], mode=Mode.SUBTRACT)
    add(cut_extrude2_tool8.solids().sort_by_distance((-1055, -255, 135.2924))[0], mode=Mode.SUBTRACT)

    # Sketch11 → Cut-Extrude3 (cut)
    with BuildSketch(Plane(origin=(0, 0, 0), x_dir=(-1, 0, 0), z_dir=(0, 0, -1))):
        with Locations((-100, -25)):
            Circle(SKETCH11_R)
    extrude(amount=-CUT_EXTRUDE3_DEPTH, mode=Mode.SUBTRACT)


solid = part.part
